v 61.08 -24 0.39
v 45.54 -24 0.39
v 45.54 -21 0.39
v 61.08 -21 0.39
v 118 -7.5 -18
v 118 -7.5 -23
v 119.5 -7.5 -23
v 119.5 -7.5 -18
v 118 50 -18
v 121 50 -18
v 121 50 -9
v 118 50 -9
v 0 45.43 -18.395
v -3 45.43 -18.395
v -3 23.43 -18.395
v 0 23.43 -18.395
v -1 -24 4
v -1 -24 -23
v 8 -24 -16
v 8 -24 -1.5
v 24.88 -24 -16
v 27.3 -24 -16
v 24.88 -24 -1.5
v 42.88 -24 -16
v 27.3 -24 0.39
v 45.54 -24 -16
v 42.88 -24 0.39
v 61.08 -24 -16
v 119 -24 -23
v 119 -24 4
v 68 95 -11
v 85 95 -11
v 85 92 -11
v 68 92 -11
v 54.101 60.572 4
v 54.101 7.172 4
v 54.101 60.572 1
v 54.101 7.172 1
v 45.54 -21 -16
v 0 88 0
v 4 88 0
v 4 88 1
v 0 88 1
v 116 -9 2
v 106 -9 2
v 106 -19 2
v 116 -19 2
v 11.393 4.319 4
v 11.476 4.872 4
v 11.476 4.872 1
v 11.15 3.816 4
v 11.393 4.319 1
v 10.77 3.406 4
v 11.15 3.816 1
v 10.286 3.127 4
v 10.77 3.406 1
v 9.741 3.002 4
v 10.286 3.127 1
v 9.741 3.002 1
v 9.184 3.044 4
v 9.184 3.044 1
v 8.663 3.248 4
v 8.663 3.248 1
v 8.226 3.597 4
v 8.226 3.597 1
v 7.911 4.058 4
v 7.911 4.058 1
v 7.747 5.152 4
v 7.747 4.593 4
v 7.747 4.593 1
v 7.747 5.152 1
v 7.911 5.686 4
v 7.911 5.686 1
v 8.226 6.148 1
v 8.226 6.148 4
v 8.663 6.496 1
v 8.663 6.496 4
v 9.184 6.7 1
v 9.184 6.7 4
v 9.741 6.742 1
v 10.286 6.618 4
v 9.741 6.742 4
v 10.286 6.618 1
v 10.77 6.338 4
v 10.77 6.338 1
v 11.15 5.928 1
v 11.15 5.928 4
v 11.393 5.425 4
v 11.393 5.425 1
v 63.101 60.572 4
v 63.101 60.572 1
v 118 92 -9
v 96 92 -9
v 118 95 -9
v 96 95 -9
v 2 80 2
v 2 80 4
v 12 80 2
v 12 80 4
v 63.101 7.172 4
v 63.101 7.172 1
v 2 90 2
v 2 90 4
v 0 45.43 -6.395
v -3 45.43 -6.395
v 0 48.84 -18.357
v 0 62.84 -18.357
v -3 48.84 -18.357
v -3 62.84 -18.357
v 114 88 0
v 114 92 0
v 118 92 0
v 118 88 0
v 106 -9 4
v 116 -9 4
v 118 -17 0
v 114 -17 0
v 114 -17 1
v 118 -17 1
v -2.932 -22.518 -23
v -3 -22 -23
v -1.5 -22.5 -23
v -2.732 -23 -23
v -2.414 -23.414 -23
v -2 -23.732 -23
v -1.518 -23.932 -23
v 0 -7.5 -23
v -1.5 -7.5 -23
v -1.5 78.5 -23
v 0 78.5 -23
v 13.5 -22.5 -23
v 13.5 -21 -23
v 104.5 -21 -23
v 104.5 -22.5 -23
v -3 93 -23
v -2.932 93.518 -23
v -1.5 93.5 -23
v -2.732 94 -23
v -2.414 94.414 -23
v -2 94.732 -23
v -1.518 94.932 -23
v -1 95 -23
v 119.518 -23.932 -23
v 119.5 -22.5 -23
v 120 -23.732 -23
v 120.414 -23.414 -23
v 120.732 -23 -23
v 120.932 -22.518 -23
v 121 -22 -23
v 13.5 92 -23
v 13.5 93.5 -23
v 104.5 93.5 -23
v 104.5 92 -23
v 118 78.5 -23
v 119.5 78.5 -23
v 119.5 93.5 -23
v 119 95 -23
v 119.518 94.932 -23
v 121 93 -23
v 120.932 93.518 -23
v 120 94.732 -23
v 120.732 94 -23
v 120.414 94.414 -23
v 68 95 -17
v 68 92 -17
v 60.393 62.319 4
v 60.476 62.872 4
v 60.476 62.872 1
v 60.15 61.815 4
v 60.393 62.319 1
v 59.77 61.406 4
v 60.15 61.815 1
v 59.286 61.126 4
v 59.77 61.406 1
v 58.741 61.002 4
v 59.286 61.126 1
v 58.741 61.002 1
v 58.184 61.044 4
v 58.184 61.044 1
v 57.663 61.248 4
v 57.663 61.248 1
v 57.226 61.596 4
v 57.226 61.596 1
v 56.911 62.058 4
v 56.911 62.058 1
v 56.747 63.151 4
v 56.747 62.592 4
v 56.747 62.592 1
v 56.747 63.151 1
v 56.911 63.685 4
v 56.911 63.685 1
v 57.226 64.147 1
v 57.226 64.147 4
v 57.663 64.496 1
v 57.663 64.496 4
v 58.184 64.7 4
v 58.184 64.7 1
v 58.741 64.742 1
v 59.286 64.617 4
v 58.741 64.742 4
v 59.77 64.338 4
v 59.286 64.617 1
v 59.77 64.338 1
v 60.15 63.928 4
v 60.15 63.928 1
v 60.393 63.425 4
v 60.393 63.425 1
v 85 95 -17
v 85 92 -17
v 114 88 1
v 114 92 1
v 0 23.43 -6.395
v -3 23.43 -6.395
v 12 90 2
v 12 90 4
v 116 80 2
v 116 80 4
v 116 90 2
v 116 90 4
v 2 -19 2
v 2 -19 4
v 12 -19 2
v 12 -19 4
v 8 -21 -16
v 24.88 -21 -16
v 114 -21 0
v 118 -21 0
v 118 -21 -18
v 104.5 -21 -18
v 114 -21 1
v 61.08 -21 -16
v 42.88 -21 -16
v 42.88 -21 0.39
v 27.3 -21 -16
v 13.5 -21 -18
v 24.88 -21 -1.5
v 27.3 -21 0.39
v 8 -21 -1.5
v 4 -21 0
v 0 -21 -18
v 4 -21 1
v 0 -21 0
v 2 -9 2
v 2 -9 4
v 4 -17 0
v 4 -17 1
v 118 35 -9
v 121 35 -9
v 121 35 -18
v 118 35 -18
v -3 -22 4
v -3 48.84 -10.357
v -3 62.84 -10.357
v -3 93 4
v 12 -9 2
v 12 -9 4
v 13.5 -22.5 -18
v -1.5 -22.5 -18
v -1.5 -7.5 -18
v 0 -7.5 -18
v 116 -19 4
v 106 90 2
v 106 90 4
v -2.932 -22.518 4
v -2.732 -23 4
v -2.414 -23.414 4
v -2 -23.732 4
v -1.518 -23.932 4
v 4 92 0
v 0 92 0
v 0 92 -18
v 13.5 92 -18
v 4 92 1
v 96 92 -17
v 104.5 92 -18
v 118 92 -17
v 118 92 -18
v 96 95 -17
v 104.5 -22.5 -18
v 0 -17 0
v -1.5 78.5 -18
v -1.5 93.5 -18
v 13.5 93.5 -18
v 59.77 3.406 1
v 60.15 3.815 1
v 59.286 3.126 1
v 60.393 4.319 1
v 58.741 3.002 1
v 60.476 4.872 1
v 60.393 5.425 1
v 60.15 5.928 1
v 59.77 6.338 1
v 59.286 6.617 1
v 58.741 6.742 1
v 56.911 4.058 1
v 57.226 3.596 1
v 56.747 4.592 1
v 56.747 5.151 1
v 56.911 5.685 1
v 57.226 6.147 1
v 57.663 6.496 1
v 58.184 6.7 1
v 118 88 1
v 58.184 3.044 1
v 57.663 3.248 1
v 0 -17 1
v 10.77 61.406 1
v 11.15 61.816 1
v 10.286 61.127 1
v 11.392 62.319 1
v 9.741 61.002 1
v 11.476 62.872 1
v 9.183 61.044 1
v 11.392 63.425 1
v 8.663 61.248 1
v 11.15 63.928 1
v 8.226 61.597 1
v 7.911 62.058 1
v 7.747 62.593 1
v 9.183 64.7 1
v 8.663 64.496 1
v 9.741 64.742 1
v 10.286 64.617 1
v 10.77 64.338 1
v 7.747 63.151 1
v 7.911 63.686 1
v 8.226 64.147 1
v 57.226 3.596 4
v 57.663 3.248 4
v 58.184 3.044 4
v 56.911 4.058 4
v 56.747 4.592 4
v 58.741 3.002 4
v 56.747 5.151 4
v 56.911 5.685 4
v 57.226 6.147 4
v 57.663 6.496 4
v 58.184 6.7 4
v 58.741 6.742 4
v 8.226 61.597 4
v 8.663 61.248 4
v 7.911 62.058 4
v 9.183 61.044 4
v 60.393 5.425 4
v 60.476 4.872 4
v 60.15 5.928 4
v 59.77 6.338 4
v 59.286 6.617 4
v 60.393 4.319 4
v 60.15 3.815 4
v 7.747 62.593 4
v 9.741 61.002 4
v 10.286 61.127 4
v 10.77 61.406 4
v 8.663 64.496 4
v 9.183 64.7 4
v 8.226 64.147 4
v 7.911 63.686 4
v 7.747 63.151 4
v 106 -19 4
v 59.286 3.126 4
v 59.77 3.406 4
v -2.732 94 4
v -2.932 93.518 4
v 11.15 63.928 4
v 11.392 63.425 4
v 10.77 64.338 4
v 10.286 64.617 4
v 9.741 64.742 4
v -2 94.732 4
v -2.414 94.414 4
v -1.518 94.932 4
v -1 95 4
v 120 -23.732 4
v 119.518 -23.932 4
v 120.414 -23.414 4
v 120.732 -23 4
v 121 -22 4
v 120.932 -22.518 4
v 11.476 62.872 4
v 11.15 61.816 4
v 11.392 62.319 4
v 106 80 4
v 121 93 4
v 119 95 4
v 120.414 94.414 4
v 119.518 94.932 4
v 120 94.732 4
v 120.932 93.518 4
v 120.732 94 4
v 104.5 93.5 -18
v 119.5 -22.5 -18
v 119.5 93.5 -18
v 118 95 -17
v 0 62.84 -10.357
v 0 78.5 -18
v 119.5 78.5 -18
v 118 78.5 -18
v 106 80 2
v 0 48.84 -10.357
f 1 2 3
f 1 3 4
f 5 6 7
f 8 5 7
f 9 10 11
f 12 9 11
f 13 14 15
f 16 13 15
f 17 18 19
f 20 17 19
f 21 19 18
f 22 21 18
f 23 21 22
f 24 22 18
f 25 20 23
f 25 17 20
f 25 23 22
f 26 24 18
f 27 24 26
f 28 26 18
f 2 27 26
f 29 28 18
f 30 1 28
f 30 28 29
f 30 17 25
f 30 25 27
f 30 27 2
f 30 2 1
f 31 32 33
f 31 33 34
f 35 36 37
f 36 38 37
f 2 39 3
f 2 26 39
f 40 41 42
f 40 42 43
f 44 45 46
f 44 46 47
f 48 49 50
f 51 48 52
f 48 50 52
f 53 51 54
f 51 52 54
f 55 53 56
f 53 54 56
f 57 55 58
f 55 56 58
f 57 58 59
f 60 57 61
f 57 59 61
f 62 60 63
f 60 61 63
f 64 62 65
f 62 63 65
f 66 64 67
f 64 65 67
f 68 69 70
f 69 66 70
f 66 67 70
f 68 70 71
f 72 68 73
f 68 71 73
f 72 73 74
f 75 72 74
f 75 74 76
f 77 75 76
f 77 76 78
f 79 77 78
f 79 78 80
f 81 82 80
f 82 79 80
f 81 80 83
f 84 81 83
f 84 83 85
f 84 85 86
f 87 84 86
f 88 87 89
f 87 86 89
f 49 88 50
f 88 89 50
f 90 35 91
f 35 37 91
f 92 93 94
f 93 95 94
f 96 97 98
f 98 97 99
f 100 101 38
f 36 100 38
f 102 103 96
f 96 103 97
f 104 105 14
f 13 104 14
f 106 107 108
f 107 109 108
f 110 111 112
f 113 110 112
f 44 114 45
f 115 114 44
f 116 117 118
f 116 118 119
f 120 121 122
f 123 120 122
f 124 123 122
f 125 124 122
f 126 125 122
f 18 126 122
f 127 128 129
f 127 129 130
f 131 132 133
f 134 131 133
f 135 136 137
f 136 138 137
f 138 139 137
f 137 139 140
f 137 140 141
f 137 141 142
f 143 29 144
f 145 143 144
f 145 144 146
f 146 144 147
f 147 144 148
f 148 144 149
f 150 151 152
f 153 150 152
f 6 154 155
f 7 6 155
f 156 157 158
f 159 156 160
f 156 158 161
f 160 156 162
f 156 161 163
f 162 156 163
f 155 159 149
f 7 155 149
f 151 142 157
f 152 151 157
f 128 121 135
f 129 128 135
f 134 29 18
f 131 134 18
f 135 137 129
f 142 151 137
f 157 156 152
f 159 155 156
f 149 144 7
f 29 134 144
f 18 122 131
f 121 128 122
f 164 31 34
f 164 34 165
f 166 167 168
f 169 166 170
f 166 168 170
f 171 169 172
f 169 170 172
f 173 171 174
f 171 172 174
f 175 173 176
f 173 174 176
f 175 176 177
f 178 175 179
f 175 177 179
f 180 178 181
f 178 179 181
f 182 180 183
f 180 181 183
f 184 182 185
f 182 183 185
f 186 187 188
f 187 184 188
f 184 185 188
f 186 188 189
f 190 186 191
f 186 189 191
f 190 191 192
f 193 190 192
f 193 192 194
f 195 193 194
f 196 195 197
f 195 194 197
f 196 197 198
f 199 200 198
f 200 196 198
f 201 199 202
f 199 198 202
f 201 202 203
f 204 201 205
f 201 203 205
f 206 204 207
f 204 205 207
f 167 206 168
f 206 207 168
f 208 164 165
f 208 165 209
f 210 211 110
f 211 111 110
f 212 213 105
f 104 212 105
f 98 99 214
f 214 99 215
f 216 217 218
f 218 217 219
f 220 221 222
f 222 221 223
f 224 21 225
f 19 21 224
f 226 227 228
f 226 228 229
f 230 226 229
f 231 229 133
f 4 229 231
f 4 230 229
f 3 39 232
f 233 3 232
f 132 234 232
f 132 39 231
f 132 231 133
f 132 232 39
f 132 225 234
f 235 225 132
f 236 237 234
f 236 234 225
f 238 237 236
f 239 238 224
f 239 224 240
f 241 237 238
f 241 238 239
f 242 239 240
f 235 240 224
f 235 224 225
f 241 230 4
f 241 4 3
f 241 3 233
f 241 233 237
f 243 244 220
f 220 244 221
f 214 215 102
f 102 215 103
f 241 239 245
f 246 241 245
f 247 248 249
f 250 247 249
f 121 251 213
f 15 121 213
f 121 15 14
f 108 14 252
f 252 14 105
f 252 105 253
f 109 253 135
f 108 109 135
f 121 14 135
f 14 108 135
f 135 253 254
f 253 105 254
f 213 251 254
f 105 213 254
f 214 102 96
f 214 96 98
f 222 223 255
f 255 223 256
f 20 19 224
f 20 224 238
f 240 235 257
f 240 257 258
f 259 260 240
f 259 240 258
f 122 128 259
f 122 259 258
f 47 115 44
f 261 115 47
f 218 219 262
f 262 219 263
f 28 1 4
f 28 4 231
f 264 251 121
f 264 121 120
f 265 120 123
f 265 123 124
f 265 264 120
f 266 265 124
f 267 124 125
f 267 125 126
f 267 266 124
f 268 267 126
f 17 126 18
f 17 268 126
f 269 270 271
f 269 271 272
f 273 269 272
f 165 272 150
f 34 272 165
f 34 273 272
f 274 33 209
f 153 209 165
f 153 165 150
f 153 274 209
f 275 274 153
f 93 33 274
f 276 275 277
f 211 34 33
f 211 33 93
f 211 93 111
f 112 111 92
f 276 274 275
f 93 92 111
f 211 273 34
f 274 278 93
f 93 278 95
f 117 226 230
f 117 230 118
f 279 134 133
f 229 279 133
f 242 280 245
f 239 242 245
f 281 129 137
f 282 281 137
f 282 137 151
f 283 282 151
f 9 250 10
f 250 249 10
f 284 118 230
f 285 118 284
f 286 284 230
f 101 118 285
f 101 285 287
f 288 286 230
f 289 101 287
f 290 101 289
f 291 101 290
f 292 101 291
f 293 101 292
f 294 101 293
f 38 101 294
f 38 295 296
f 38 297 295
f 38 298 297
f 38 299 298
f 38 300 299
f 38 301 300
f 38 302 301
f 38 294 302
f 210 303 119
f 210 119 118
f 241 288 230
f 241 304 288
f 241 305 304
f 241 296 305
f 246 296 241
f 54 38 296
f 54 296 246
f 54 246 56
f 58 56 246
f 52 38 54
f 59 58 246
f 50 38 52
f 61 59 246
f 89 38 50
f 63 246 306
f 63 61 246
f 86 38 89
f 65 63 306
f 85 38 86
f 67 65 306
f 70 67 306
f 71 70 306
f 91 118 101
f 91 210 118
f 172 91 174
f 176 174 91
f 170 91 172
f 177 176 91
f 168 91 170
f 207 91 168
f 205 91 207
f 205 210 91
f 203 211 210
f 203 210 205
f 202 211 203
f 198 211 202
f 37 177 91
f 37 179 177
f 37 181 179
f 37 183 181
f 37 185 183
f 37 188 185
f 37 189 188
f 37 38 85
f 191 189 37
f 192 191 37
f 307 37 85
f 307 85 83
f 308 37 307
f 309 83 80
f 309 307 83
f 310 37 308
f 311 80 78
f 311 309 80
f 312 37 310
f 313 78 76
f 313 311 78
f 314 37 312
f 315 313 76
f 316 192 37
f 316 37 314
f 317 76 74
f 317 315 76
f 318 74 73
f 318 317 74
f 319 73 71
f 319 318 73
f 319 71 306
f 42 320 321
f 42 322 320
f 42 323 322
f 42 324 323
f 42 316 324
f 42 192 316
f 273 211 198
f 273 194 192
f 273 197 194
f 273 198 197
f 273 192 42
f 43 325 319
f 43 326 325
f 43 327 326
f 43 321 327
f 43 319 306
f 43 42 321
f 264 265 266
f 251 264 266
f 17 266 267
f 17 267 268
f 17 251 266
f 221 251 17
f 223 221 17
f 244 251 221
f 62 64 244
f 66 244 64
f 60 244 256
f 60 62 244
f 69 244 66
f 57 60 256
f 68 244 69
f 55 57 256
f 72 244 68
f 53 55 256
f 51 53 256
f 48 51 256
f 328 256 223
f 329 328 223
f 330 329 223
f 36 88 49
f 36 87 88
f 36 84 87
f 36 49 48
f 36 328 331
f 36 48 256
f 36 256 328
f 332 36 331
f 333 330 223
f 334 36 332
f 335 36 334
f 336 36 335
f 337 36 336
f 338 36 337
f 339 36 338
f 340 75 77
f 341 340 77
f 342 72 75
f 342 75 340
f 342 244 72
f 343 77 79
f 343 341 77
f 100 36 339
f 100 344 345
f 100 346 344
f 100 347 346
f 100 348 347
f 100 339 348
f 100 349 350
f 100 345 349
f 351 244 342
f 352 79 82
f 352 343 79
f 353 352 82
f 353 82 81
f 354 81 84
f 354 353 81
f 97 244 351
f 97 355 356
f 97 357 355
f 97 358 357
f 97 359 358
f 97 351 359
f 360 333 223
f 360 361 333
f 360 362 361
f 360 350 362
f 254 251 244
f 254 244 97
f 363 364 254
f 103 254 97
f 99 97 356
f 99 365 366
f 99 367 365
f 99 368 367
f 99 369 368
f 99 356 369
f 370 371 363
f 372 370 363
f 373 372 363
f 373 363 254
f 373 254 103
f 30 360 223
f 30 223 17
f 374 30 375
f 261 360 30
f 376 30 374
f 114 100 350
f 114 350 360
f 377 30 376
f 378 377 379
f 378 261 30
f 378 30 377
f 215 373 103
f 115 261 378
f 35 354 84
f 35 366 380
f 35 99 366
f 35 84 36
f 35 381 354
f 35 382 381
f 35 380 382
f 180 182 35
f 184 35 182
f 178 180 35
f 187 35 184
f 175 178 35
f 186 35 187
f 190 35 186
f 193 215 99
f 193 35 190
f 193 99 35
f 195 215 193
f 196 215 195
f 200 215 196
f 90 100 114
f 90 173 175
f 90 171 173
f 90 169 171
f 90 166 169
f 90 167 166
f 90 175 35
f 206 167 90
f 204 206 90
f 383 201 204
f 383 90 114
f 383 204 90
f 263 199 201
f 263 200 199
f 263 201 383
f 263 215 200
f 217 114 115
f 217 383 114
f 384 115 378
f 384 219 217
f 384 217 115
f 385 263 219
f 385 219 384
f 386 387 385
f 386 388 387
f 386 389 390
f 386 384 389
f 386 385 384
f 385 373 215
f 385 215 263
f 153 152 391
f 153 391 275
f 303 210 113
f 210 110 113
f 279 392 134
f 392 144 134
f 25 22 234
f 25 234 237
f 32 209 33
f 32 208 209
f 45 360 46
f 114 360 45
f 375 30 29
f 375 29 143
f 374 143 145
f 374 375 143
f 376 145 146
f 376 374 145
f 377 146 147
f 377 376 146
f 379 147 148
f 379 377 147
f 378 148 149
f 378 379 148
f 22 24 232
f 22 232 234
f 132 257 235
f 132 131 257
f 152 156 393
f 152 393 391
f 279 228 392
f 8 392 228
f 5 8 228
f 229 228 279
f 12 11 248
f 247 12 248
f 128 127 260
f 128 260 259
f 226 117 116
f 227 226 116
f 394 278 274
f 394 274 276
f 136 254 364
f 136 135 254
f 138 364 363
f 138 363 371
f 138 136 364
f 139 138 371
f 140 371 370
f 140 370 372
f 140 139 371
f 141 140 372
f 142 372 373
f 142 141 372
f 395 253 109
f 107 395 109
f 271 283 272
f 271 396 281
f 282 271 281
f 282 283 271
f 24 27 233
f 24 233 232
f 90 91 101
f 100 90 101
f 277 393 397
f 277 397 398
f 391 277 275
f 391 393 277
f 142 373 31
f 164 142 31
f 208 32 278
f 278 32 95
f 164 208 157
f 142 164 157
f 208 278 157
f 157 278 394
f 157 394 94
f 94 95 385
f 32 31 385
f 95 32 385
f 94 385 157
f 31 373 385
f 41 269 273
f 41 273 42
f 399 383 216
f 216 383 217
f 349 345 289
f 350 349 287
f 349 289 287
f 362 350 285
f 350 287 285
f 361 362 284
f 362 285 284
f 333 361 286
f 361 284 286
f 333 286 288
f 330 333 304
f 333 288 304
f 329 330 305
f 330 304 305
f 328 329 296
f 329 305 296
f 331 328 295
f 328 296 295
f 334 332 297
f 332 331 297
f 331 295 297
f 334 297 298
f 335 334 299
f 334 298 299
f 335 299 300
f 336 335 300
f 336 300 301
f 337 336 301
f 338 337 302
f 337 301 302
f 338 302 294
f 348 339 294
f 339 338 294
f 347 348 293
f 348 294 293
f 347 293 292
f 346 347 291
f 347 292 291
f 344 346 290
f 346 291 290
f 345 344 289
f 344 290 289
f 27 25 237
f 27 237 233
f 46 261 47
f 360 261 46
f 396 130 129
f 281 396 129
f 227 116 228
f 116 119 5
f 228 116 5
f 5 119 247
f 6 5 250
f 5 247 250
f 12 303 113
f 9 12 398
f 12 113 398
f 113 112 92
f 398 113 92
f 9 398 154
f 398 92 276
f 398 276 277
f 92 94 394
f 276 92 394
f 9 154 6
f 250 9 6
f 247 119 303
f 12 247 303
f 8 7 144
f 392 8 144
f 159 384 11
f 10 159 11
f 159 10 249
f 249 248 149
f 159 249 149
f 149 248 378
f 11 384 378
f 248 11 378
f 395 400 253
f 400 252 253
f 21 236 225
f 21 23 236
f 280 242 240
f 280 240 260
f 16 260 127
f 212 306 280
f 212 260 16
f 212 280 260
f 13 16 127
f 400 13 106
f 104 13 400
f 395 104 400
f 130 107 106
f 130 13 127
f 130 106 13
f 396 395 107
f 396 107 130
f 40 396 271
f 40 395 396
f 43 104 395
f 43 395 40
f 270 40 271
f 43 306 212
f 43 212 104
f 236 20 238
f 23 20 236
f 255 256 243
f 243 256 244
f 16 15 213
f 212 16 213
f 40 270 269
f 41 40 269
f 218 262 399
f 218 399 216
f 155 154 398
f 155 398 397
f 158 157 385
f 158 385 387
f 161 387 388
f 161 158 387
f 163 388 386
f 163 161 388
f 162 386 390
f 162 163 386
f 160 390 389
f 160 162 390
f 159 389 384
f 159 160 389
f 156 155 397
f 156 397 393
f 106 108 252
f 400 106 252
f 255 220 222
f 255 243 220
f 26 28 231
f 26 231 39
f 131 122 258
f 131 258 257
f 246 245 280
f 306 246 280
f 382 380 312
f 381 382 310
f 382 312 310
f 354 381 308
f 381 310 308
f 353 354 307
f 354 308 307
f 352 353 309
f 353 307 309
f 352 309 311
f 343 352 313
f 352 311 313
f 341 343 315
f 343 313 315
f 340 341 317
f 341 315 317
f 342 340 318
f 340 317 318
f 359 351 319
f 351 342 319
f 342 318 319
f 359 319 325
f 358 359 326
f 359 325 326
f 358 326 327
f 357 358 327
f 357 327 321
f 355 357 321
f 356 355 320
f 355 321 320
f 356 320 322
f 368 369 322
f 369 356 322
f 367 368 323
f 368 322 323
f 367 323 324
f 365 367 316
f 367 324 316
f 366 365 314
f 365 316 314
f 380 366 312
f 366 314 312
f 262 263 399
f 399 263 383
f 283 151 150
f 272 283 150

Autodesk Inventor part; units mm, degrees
ref_plane "YZ Plane" through (0, 0, 0) normal (1, 0, 0) x (0, 1, 0)
ref_plane "XZ Plane" through (0, 0, 0) normal (0, 1, 0) x (-1, 0, 0)
ref_plane "XY Plane" through (0, 0, 0) normal (0, 0, 1) x (1, 0, 0)
sketch "Esquisse1" plane through (0, 0, 0) normal (0, 0, 1) x (1, 0, 0)
  line L0 (0, -47.8) -> (0, 118.8) projected
  line L1 (-27.8, 0) -> (145.8, 0) projected
  line L2 (0, 92) -> (105, 92)
  line L3 (105, 92) -> (105, 0)
  line L4 (105, 0) -> (0, 0)
  line L5 (0, 0) -> (0, 92)
  line L6 (56.1007, 59.272) -> (61.1007, 59.272)
  line L7 (61.1007, 59.272) -> (61.1007, 8.472)
  line L8 (61.1007, 8.472) -> (56.1007, 8.472)
  line L9 (56.1007, 8.472) -> (56.1007, 59.272)
  line L10 (0, 92) -> (118, 92)
  line L11 (118, 92) -> (118, -21)
  line L12 (118, -21) -> (0, -21)
  line L13 (0, -21) -> (0, 92)
  line L14 (54.1007, 60.572) -> (63.1007, 60.572)
  line L15 (63.1007, 60.572) -> (63.1007, 7.172)
  line L16 (63.1007, 7.172) -> (54.1007, 7.172)
  line L17 (54.1007, 7.172) -> (54.1007, 60.572)
  line L18 (-3, 95) -> (121, 95)
  line L19 (121, 95) -> (121, -24)
  line L20 (121, -24) -> (-3, -24)
  line L21 (-3, -24) -> (-3, 95)
  line L22 (0, 92) -> (118, 92)
  line L23 (118, 92) -> (118, -21)
  line L24 (118, -21) -> (0, -21)
  line L25 (0, -21) -> (0, 92)
  line L26 (57.2447, 8.472) -> (59.9567, 8.472) projected
  line L27 (59.9567, 59.272) -> (57.2447, 59.272) projected
  line L28 (56.1007, 33.3434) -> (56.1007, 31.8605) projected
  line L29 (61.1007, 31.8605) -> (61.1007, 33.3434) projected
  circle A0 centre (58.6009, 4.8718) radius 1.3752 projected
  circle A1 centre (58.601, 62.8718) radius 1.3753 projected
  circle A2 centre (9.6007, 62.872) radius 1.375 projected
  circle A3 centre (9.6008, 4.8721) radius 1.3752 projected
  circle A4 centre (9.6008, 4.8721) radius 1.8752
  circle A5 centre (9.6007, 62.872) radius 1.875
  circle A6 centre (58.601, 62.8718) radius 1.8753
  circle A7 centre (58.6009, 4.8718) radius 1.8752
  point P0 (0, 0)
  point P1 (58.6007, 59.272)
  dimension "d0" = 92
  dimension "d1" = 105
  dimension "d6" = 13
  dimension "d7" = 21
  dimension "d8" = 2
  dimension "d9" = 1.3
  dimension "d11" = 1.3
  dimension "d12" = 3
  dimension "d13" = 3
  dimension "d14" = 3
  dimension "d15" = 3
  dimension "d77" = 2
  dimension "d78" = 0.5
  dimension "d79" = 0.5
  dimension "d80" = 0.5
  dimension "d81" = 0.5
extrude "Extrusion1" add sketch "Esquisse1" along normal blind 4 contours L0 L20 L21 L1 | L12 L11 L1 L19 L20 L0 | L0 L1 L11 L12 | L1 L21 L18 L0 | L0 L2 L3 L1 | L0 L18 L19 L1 L11 L10 L2 | L3 L10 L11 L1
sketch "Esquisse2" plane through (0, 0, 4) normal (0, 0, 1) x (1, 0, 0)
  line L0 (-3, -24) -> (121, -24) projected
  line L1 (-3, 95) -> (121, 95)
  line L2 (121, 95) -> (121, -24)
  line L3 (121, -24) -> (-3, -24)
  line L4 (-3, -24) -> (-3, 95)
  line L5 (0, 92) -> (118, 92)
  line L6 (118, 92) -> (118, -21)
  line L7 (118, -21) -> (0, -21)
  line L8 (0, -21) -> (0, 92)
  point P0 (0, 0)
  dimension "d18" = 3
  dimension "d19" = 3
  dimension "d20" = 3
  dimension "d21" = 3
extrude "Extrusion2" add sketch "Esquisse2" against normal blind 27
sketch "Esquisse4" plane through (-3, -24, 4) normal (0, -1, 0) x (1, 0, 0)
  line L0 (27.38, -19.5) -> (27.38, -6) construction
  line L1 (27.38, -6) -> (11.5, -6) construction
  line L2 (11.5, -6) -> (11.5, -19.5) construction
  line L3 (62.1007, -19.5) -> (12.1007, -19.5) construction
  line L4 (9.1005, -19.5) -> (15.101, -19.5) construction
  line L5 (41.19, -4.01) -> (35.19, -4.01) construction
  line L6 (44.5455, -4.11) -> (31.8345, -4.11) construction
  line L7 (41.19, -2.5351) -> (41.19, -5.6849) construction
  line L8 (35.19, -5.6849) -> (35.19, -2.5351) construction
  circle A0 centre (31.94, -4.51) radius 0.4 construction
  line L9 (31.54, -4.4044) -> (31.54, -9.4204) construction
  line L10 (31.3, -5.5007) -> (31.3, -19.2199) construction
  line L11 (31.3, -5.3465) -> (31.3, -5.5636) construction
  line L12 (31.7209, -4.66) -> (31.5122, -4.66) construction
  line L13 (31.7172, -4.66) -> (31.5053, -4.66) construction
  line L14 (30.64, -9.7204) -> (30.64, -12.7204) construction
  line L15 (30.64, -12.7204) -> (31.3599, -12.7204) construction
  line L16 (31.322, -9.7204) -> (30.64, -9.7204) construction
  line L17 (44.44, -9.27) -> (44.44, -14.39) construction
  line L18 (63.74, -12.7204) -> (63.74, -9.7204) construction
  line L19 (63.08, -19.182) -> (63.08, -5.5251) construction
  line L20 (60.2447, -19.5) -> (62.9567, -19.5) construction
  line L21 (63.08, -18.9857) -> (63.08, -19.517) construction
  line L22 (59.1017, -19.5) -> (65.1003, -19.5) construction
  line L23 (63.08, -4.6635) -> (63.08, -6.647) construction
  circle A1 centre (62.4398, -4.5101) radius 0.4002 construction
  line L24 (62.84, -9.4204) -> (62.84, -4.4044) construction
  line L25 (62.8795, -4.66) -> (62.5088, -4.66) construction
  line L26 (63.08, -4.6726) -> (63.08, -4.66) construction
  line L27 (62.5455, -4.11) -> (49.8345, -4.11) construction
  circle A2 centre (49.94, -4.51) radius 0.4 construction
  line L28 (49.54, -4.4044) -> (49.54, -9.4204) construction
  line L29 (64.08, -20) -> (48.54, -20)
  line L30 (48.54, -20) -> (48.54, -3.61)
  line L31 (48.54, -3.61) -> (64.08, -3.61)
  line L32 (64.08, -3.61) -> (64.08, -20)
  line L33 (45.88, -20) -> (30.3, -20)
  line L34 (30.3, -20) -> (30.3, -3.61)
  line L35 (30.3, -3.61) -> (45.88, -3.61)
  line L36 (45.88, -3.61) -> (45.88, -20)
  line L37 (44.88, -5.5659) -> (44.88, -19.1471) projected
  line L38 (27.88, -20) -> (11, -20) construction
  line L39 (11, -20) -> (11, -5.5) construction
  line L40 (11, -5.5) -> (27.88, -5.5) construction
  line L41 (27.88, -5.5) -> (27.88, -20) construction
  line L42 (27.88, -20) -> (11, -20)
  line L43 (11, -20) -> (11, -5.5)
  line L44 (11, -5.5) -> (27.88, -5.5)
  line L45 (27.88, -5.5) -> (27.88, -20)
  point P0 (3, -4)
  dimension "d52" = 0.5
  dimension "d53" = 1
  dimension "d54" = 0.5
  dimension "d55" = 1
  dimension "d56" = 1
  dimension "d57" = 1
  dimension "d59" = 0.5
  dimension "d60" = 0.5
  dimension "d61" = 0.5
  dimension "d62" = 0.5
  dimension "d63" = 0.5
  dimension "d64" = 0.5
extrude "Extrusion4" cut sketch "Esquisse4" against normal blind 27
sketch "Esquisse5" plane through (-3, -24, 4) normal (-1, 0, 0) x (0, 0, 1)
  line L0 (-13.62, 51.6049) -> (-13.62, 65.2689) projected
  line L1 (-19.17, 63.3546) -> (-19.17, 58.0099) projected
  line L2 (-19.17, 57.98) -> (-19.17, 53.5054) projected
  line L3 (-16.9746, 76.7653) -> (-16.9746, 82.8881) projected
  line L4 (-19.7386, 82.3643) -> (-19.7386, 79.9819) projected
  line L5 (-19.7386, 79.6728) -> (-19.7386, 77.3076) projected
  line L6 (-17.0251, 50.93) -> (-14.2949, 50.93) projected
  line L7 (-14.2811, 65.93) -> (-17.0251, 65.93) projected
  line L8 (-18.2776, 75.8396) -> (-17.9619, 75.8396) projected
  line L9 (-17.9553, 83.8204) -> (-18.271, 83.8204) projected
  line L10 (-22.395, 47.43) -> (-10.395, 47.43)
  line L11 (-10.395, 47.43) -> (-10.395, 69.43)
  line L12 (-10.395, 69.43) -> (-22.395, 69.43)
  line L13 (-22.395, 69.43) -> (-22.395, 47.43)
  line L14 (-22.3566, 72.8396) -> (-14.3566, 72.8396)
  line L15 (-14.3566, 72.8396) -> (-14.3566, 86.8396)
  line L16 (-14.3566, 86.8396) -> (-22.3566, 86.8396)
  line L17 (-22.3566, 86.8396) -> (-22.3566, 72.8396)
  point P0 (-4, 24)
  point P1 (-16.395, 69.43)
  point P2 (-18.1197, 75.8396)
  dimension "d67" = 22
  dimension "d68" = 12
  dimension "d69" = 3.225
  dimension "d70" = 3.5
  dimension "d71" = 14
  dimension "d72" = 8
  dimension "d73" = 2.618
  dimension "d74" = 3
extrude "Extrusion5" cut sketch "Esquisse5" against normal blind 27
sketch "Esquisse6" plane through (-3, 95, 4) normal (0, 1, 0) x (1, 0, 0)
  line L0 (121, 4) -> (121, 27) projected
  line L1 (121, 27) -> (121, 0)
  line L2 (124, 0) -> (0, 0) projected
  line L3 (3, 4) -> (121, 4) projected
  line L4 (121, 4) -> (71, 4)
  line L5 (71, 4) -> (71, 21)
  line L6 (71, 21) -> (121, 21)
  line L7 (121, 21) -> (121, 4)
  line L8 (71, 21) -> (88, 21)
  line L9 (88, 21) -> (88, 15)
  line L10 (88, 15) -> (71, 15)
  line L11 (71, 15) -> (71, 21)
  line L12 (121, 21) -> (99, 21)
  line L13 (99, 21) -> (99, 13)
  line L14 (99, 13) -> (121, 13)
  line L15 (121, 13) -> (121, 21)
  point P0 (71, 12.5)
  point P1 (99, 21)
  point P2 (88, 21)
  dimension "d82" = 50
  dimension "d83" = 17
  dimension "d84" = 8
  dimension "d85" = 22
  dimension "d86" = 17
  dimension "d87" = 6
extrude "Extrusion6" cut sketch "Esquisse6" against normal blind 3 contours L14 L13 L6 L0 | L5 L6 L9 L10
sketch "Esquisse7" plane through (121, -24, 4) normal (1, 0, 0) x (0, 0, -1)
  line L0 (22, 74) -> (13, 74)
  line L1 (13, 59) -> (22, 59)
  line L2 (22, 59) -> (22, 74)
  line L3 (0, 119) -> (27, 119) projected
  line L4 (13, 74) -> (13, 59)
  line L5 (0, 0) -> (0, 119) projected
  point P0 (4, 24)
  point P1 (13, 66.5)
  dimension "d90" = 60
  dimension "d91" = 45
  dimension "d92" = 13
  dimension "d93" = 9
extrude "Extrusion7" cut sketch "Esquisse7" against normal blind 3
sketch "Esquisse8" plane through (0, 0, -23) normal (0, 0, -1) x (-1, 0, 0)
  line L0 (-1.5, 90.5) -> (1.5, 90.5)
  line L1 (1.5, 90.5) -> (1.5, 93.5)
  line L2 (1.5, 93.5) -> (-1.5, 93.5)
  line L3 (-1.5, 93.5) -> (-1.5, 90.5)
  line L4 (-118, 92) -> (0, 92) projected
  line L5 (-1.5, 90.5) -> (1.5, 93.5) construction
  line L6 (1.5, 90.5) -> (-1.5, 93.5) construction
  line L7 (-1.5, -19.5) -> (1.5, -19.5)
  line L8 (1.5, -19.5) -> (1.5, -22.5)
  line L9 (1.5, -22.5) -> (-1.5, -22.5)
  line L10 (-1.5, -22.5) -> (-1.5, -19.5)
  line L11 (-1.5, -19.5) -> (1.5, -22.5) construction
  line L12 (1.5, -19.5) -> (-1.5, -22.5) construction
  line L13 (-116.5, 93.5) -> (-119.5, 93.5)
  line L14 (-119.5, 93.5) -> (-119.5, 90.5)
  line L15 (-119.5, 90.5) -> (-116.5, 90.5)
  line L16 (-116.5, 90.5) -> (-116.5, 93.5)
  line L17 (-118, -21) -> (-118, 92) projected
  line L18 (-116.5, 93.5) -> (-119.5, 90.5) construction
  line L19 (-119.5, 93.5) -> (-116.5, 90.5) construction
  line L20 (-119.5, -19.5) -> (-116.5, -19.5)
  line L21 (-116.5, -19.5) -> (-116.5, -22.5)
  line L22 (-116.5, -22.5) -> (-119.5, -22.5)
  line L23 (-119.5, -22.5) -> (-119.5, -19.5)
  line L24 (-119.5, -19.5) -> (-116.5, -22.5) construction
  line L25 (-116.5, -19.5) -> (-119.5, -22.5) construction
  line L26 (1.5, 93.5) -> (-13.5, 93.5)
  line L27 (-13.5, 93.5) -> (-13.5, 78.5)
  line L28 (-13.5, 78.5) -> (1.5, 78.5)
  line L29 (1.5, 78.5) -> (1.5, 93.5)
  line L30 (1.5, -22.5) -> (-13.5, -22.5)
  line L31 (-13.5, -22.5) -> (-13.5, -7.5)
  line L32 (-13.5, -7.5) -> (1.5, -7.5)
  line L33 (1.5, -7.5) -> (1.5, -22.5)
  line L34 (-119.5, -22.5) -> (-104.5, -22.5)
  line L35 (-104.5, -22.5) -> (-104.5, -7.5)
  line L36 (-104.5, -7.5) -> (-119.5, -7.5)
  line L37 (-119.5, -7.5) -> (-119.5, -22.5)
  line L38 (-119.5, 93.5) -> (-104.5, 93.5)
  line L39 (-104.5, 93.5) -> (-104.5, 78.5)
  line L40 (-104.5, 78.5) -> (-119.5, 78.5)
  line L41 (-119.5, 78.5) -> (-119.5, 93.5)
  point P0 (0, 0)
  point P1 (0, -21)
  point P2 (-118, 78.5)
  point P3 (-104.5, 92)
  point P4 (-116.5, 92)
  point P5 (-118, 90.5)
  point P6 (-118, -7.5)
  point P7 (-118, -19.5)
  point P8 (1.5, 90.5)
  point P9 (-1.5, 92)
  point P10 (-13.5, 92)
  point P11 (-1.5, 93.5)
  dimension "d96" = 3
  dimension "d97" = 3
  dimension "d98" = 3
  dimension "d99" = 3
  dimension "d100" = 3
  dimension "d101" = 3
  dimension "d102" = 3
  dimension "d105" = 15
  dimension "d106" = 15
  dimension "d107" = 15
  dimension "d108" = 15
  dimension "d109" = 15
extrude "Extrusion8" cut sketch "Esquisse8" against normal blind 5
sketch "Esquisse10" plane through (0, 0, 0) normal (0, 0, -1) x (-1, 0, 0)
  line L0 (0, -21) -> (0, -7.5) projected
  line L1 (0, -21) -> (-4, -21)
  line L2 (-4, -21) -> (-4, -17)
  line L3 (-4, -17) -> (0, -17)
  line L4 (0, -17) -> (0, -21)
  line L5 (-118, -21) -> (-61.08, -21) projected
  line L6 (-118, -21) -> (-114, -21)
  line L7 (-114, -21) -> (-114, -17)
  line L8 (-114, -17) -> (-118, -17)
  line L9 (-118, -17) -> (-118, -21)
  line L10 (0, -21) -> (0, 92) projected
  line L11 (0, 92) -> (-4, 92)
  line L12 (-4, 92) -> (-4, 88)
  line L13 (-4, 88) -> (0, 88)
  line L14 (0, 88) -> (0, 92)
  line L15 (-118, 92) -> (-118, -21) projected
  line L16 (-118, 92) -> (-114, 92)
  line L17 (-114, 92) -> (-114, 88)
  line L18 (-114, 88) -> (-118, 88)
  line L19 (-118, 88) -> (-118, 92)
  line L20 (0, -21) -> (-118, -21)
  line L21 (-118, -21) -> (-118, 92)
  line L22 (-118, 92) -> (0, 92)
  line L23 (0, 92) -> (0, -21)
  point P0 (0, 0)
  point P1 (0, -17)
  dimension "d119" = 4
  dimension "d120" = 4
  dimension "d121" = 4
  dimension "d122" = 4
  dimension "d123" = 4
  dimension "d124" = 4
  dimension "d125" = 4
  dimension "d126" = 4
extrude "Extrusion10" cut sketch "Esquisse10" against normal blind 1 contours L3 L2 L20 L5 L7 L8 L15 L18 L17 L22 L12 L13 L10 L0
fillet "Congé1" radius 2 4 edges at (-3, -24, -9.5) (121, -24, -9.5) (-3, 95, -9.5) (121, 95, -9.5)
sketch "Esquisse11" plane through (0, 0, 4) normal (0, 0, 1) x (1, 0, 0)
  line L0 (106, 80) -> (116, 80)
  line L1 (116, 80) -> (116, 90)
  line L2 (116, 90) -> (106, 90)
  line L3 (106, 90) -> (106, 80)
  line L4 (119, 95) -> (-1, 95) projected
  line L5 (121, -22) -> (121, 93) projected
  line L6 (116, -19) -> (106, -19)
  line L7 (106, -19) -> (106, -9)
  line L8 (106, -9) -> (116, -9)
  line L9 (116, -9) -> (116, -19)
  line L10 (-1, -24) -> (119, -24) projected
  line L11 (12, -9) -> (2, -9)
  line L12 (2, -9) -> (2, -19)
  line L13 (2, -19) -> (12, -19)
  line L14 (12, -19) -> (12, -9)
  line L15 (-3, 93) -> (-3, -22) projected
  line L16 (12, 90) -> (2, 90)
  line L17 (2, 90) -> (2, 80)
  line L18 (2, 80) -> (12, 80)
  line L19 (12, 80) -> (12, 90)
  point P0 (0, 0)
  point P1 (111, 90)
  point P2 (111, -19)
  dimension "d130" = 10
  dimension "d131" = 10
  dimension "d132" = 5
  dimension "d133" = 5
  dimension "d134" = 10
  dimension "d135" = 10
  dimension "d136" = 5
  dimension "d137" = 5
  dimension "d138" = 10
  dimension "d139" = 10
  dimension "d140" = 5
  dimension "d141" = 5
  dimension "d142" = 5
  dimension "d143" = 10
  dimension "d144" = 10
  dimension "d145" = 5
extrude "Extrusion11" cut sketch "Esquisse11" against normal blind 2
properties part number "coque_RPI"
